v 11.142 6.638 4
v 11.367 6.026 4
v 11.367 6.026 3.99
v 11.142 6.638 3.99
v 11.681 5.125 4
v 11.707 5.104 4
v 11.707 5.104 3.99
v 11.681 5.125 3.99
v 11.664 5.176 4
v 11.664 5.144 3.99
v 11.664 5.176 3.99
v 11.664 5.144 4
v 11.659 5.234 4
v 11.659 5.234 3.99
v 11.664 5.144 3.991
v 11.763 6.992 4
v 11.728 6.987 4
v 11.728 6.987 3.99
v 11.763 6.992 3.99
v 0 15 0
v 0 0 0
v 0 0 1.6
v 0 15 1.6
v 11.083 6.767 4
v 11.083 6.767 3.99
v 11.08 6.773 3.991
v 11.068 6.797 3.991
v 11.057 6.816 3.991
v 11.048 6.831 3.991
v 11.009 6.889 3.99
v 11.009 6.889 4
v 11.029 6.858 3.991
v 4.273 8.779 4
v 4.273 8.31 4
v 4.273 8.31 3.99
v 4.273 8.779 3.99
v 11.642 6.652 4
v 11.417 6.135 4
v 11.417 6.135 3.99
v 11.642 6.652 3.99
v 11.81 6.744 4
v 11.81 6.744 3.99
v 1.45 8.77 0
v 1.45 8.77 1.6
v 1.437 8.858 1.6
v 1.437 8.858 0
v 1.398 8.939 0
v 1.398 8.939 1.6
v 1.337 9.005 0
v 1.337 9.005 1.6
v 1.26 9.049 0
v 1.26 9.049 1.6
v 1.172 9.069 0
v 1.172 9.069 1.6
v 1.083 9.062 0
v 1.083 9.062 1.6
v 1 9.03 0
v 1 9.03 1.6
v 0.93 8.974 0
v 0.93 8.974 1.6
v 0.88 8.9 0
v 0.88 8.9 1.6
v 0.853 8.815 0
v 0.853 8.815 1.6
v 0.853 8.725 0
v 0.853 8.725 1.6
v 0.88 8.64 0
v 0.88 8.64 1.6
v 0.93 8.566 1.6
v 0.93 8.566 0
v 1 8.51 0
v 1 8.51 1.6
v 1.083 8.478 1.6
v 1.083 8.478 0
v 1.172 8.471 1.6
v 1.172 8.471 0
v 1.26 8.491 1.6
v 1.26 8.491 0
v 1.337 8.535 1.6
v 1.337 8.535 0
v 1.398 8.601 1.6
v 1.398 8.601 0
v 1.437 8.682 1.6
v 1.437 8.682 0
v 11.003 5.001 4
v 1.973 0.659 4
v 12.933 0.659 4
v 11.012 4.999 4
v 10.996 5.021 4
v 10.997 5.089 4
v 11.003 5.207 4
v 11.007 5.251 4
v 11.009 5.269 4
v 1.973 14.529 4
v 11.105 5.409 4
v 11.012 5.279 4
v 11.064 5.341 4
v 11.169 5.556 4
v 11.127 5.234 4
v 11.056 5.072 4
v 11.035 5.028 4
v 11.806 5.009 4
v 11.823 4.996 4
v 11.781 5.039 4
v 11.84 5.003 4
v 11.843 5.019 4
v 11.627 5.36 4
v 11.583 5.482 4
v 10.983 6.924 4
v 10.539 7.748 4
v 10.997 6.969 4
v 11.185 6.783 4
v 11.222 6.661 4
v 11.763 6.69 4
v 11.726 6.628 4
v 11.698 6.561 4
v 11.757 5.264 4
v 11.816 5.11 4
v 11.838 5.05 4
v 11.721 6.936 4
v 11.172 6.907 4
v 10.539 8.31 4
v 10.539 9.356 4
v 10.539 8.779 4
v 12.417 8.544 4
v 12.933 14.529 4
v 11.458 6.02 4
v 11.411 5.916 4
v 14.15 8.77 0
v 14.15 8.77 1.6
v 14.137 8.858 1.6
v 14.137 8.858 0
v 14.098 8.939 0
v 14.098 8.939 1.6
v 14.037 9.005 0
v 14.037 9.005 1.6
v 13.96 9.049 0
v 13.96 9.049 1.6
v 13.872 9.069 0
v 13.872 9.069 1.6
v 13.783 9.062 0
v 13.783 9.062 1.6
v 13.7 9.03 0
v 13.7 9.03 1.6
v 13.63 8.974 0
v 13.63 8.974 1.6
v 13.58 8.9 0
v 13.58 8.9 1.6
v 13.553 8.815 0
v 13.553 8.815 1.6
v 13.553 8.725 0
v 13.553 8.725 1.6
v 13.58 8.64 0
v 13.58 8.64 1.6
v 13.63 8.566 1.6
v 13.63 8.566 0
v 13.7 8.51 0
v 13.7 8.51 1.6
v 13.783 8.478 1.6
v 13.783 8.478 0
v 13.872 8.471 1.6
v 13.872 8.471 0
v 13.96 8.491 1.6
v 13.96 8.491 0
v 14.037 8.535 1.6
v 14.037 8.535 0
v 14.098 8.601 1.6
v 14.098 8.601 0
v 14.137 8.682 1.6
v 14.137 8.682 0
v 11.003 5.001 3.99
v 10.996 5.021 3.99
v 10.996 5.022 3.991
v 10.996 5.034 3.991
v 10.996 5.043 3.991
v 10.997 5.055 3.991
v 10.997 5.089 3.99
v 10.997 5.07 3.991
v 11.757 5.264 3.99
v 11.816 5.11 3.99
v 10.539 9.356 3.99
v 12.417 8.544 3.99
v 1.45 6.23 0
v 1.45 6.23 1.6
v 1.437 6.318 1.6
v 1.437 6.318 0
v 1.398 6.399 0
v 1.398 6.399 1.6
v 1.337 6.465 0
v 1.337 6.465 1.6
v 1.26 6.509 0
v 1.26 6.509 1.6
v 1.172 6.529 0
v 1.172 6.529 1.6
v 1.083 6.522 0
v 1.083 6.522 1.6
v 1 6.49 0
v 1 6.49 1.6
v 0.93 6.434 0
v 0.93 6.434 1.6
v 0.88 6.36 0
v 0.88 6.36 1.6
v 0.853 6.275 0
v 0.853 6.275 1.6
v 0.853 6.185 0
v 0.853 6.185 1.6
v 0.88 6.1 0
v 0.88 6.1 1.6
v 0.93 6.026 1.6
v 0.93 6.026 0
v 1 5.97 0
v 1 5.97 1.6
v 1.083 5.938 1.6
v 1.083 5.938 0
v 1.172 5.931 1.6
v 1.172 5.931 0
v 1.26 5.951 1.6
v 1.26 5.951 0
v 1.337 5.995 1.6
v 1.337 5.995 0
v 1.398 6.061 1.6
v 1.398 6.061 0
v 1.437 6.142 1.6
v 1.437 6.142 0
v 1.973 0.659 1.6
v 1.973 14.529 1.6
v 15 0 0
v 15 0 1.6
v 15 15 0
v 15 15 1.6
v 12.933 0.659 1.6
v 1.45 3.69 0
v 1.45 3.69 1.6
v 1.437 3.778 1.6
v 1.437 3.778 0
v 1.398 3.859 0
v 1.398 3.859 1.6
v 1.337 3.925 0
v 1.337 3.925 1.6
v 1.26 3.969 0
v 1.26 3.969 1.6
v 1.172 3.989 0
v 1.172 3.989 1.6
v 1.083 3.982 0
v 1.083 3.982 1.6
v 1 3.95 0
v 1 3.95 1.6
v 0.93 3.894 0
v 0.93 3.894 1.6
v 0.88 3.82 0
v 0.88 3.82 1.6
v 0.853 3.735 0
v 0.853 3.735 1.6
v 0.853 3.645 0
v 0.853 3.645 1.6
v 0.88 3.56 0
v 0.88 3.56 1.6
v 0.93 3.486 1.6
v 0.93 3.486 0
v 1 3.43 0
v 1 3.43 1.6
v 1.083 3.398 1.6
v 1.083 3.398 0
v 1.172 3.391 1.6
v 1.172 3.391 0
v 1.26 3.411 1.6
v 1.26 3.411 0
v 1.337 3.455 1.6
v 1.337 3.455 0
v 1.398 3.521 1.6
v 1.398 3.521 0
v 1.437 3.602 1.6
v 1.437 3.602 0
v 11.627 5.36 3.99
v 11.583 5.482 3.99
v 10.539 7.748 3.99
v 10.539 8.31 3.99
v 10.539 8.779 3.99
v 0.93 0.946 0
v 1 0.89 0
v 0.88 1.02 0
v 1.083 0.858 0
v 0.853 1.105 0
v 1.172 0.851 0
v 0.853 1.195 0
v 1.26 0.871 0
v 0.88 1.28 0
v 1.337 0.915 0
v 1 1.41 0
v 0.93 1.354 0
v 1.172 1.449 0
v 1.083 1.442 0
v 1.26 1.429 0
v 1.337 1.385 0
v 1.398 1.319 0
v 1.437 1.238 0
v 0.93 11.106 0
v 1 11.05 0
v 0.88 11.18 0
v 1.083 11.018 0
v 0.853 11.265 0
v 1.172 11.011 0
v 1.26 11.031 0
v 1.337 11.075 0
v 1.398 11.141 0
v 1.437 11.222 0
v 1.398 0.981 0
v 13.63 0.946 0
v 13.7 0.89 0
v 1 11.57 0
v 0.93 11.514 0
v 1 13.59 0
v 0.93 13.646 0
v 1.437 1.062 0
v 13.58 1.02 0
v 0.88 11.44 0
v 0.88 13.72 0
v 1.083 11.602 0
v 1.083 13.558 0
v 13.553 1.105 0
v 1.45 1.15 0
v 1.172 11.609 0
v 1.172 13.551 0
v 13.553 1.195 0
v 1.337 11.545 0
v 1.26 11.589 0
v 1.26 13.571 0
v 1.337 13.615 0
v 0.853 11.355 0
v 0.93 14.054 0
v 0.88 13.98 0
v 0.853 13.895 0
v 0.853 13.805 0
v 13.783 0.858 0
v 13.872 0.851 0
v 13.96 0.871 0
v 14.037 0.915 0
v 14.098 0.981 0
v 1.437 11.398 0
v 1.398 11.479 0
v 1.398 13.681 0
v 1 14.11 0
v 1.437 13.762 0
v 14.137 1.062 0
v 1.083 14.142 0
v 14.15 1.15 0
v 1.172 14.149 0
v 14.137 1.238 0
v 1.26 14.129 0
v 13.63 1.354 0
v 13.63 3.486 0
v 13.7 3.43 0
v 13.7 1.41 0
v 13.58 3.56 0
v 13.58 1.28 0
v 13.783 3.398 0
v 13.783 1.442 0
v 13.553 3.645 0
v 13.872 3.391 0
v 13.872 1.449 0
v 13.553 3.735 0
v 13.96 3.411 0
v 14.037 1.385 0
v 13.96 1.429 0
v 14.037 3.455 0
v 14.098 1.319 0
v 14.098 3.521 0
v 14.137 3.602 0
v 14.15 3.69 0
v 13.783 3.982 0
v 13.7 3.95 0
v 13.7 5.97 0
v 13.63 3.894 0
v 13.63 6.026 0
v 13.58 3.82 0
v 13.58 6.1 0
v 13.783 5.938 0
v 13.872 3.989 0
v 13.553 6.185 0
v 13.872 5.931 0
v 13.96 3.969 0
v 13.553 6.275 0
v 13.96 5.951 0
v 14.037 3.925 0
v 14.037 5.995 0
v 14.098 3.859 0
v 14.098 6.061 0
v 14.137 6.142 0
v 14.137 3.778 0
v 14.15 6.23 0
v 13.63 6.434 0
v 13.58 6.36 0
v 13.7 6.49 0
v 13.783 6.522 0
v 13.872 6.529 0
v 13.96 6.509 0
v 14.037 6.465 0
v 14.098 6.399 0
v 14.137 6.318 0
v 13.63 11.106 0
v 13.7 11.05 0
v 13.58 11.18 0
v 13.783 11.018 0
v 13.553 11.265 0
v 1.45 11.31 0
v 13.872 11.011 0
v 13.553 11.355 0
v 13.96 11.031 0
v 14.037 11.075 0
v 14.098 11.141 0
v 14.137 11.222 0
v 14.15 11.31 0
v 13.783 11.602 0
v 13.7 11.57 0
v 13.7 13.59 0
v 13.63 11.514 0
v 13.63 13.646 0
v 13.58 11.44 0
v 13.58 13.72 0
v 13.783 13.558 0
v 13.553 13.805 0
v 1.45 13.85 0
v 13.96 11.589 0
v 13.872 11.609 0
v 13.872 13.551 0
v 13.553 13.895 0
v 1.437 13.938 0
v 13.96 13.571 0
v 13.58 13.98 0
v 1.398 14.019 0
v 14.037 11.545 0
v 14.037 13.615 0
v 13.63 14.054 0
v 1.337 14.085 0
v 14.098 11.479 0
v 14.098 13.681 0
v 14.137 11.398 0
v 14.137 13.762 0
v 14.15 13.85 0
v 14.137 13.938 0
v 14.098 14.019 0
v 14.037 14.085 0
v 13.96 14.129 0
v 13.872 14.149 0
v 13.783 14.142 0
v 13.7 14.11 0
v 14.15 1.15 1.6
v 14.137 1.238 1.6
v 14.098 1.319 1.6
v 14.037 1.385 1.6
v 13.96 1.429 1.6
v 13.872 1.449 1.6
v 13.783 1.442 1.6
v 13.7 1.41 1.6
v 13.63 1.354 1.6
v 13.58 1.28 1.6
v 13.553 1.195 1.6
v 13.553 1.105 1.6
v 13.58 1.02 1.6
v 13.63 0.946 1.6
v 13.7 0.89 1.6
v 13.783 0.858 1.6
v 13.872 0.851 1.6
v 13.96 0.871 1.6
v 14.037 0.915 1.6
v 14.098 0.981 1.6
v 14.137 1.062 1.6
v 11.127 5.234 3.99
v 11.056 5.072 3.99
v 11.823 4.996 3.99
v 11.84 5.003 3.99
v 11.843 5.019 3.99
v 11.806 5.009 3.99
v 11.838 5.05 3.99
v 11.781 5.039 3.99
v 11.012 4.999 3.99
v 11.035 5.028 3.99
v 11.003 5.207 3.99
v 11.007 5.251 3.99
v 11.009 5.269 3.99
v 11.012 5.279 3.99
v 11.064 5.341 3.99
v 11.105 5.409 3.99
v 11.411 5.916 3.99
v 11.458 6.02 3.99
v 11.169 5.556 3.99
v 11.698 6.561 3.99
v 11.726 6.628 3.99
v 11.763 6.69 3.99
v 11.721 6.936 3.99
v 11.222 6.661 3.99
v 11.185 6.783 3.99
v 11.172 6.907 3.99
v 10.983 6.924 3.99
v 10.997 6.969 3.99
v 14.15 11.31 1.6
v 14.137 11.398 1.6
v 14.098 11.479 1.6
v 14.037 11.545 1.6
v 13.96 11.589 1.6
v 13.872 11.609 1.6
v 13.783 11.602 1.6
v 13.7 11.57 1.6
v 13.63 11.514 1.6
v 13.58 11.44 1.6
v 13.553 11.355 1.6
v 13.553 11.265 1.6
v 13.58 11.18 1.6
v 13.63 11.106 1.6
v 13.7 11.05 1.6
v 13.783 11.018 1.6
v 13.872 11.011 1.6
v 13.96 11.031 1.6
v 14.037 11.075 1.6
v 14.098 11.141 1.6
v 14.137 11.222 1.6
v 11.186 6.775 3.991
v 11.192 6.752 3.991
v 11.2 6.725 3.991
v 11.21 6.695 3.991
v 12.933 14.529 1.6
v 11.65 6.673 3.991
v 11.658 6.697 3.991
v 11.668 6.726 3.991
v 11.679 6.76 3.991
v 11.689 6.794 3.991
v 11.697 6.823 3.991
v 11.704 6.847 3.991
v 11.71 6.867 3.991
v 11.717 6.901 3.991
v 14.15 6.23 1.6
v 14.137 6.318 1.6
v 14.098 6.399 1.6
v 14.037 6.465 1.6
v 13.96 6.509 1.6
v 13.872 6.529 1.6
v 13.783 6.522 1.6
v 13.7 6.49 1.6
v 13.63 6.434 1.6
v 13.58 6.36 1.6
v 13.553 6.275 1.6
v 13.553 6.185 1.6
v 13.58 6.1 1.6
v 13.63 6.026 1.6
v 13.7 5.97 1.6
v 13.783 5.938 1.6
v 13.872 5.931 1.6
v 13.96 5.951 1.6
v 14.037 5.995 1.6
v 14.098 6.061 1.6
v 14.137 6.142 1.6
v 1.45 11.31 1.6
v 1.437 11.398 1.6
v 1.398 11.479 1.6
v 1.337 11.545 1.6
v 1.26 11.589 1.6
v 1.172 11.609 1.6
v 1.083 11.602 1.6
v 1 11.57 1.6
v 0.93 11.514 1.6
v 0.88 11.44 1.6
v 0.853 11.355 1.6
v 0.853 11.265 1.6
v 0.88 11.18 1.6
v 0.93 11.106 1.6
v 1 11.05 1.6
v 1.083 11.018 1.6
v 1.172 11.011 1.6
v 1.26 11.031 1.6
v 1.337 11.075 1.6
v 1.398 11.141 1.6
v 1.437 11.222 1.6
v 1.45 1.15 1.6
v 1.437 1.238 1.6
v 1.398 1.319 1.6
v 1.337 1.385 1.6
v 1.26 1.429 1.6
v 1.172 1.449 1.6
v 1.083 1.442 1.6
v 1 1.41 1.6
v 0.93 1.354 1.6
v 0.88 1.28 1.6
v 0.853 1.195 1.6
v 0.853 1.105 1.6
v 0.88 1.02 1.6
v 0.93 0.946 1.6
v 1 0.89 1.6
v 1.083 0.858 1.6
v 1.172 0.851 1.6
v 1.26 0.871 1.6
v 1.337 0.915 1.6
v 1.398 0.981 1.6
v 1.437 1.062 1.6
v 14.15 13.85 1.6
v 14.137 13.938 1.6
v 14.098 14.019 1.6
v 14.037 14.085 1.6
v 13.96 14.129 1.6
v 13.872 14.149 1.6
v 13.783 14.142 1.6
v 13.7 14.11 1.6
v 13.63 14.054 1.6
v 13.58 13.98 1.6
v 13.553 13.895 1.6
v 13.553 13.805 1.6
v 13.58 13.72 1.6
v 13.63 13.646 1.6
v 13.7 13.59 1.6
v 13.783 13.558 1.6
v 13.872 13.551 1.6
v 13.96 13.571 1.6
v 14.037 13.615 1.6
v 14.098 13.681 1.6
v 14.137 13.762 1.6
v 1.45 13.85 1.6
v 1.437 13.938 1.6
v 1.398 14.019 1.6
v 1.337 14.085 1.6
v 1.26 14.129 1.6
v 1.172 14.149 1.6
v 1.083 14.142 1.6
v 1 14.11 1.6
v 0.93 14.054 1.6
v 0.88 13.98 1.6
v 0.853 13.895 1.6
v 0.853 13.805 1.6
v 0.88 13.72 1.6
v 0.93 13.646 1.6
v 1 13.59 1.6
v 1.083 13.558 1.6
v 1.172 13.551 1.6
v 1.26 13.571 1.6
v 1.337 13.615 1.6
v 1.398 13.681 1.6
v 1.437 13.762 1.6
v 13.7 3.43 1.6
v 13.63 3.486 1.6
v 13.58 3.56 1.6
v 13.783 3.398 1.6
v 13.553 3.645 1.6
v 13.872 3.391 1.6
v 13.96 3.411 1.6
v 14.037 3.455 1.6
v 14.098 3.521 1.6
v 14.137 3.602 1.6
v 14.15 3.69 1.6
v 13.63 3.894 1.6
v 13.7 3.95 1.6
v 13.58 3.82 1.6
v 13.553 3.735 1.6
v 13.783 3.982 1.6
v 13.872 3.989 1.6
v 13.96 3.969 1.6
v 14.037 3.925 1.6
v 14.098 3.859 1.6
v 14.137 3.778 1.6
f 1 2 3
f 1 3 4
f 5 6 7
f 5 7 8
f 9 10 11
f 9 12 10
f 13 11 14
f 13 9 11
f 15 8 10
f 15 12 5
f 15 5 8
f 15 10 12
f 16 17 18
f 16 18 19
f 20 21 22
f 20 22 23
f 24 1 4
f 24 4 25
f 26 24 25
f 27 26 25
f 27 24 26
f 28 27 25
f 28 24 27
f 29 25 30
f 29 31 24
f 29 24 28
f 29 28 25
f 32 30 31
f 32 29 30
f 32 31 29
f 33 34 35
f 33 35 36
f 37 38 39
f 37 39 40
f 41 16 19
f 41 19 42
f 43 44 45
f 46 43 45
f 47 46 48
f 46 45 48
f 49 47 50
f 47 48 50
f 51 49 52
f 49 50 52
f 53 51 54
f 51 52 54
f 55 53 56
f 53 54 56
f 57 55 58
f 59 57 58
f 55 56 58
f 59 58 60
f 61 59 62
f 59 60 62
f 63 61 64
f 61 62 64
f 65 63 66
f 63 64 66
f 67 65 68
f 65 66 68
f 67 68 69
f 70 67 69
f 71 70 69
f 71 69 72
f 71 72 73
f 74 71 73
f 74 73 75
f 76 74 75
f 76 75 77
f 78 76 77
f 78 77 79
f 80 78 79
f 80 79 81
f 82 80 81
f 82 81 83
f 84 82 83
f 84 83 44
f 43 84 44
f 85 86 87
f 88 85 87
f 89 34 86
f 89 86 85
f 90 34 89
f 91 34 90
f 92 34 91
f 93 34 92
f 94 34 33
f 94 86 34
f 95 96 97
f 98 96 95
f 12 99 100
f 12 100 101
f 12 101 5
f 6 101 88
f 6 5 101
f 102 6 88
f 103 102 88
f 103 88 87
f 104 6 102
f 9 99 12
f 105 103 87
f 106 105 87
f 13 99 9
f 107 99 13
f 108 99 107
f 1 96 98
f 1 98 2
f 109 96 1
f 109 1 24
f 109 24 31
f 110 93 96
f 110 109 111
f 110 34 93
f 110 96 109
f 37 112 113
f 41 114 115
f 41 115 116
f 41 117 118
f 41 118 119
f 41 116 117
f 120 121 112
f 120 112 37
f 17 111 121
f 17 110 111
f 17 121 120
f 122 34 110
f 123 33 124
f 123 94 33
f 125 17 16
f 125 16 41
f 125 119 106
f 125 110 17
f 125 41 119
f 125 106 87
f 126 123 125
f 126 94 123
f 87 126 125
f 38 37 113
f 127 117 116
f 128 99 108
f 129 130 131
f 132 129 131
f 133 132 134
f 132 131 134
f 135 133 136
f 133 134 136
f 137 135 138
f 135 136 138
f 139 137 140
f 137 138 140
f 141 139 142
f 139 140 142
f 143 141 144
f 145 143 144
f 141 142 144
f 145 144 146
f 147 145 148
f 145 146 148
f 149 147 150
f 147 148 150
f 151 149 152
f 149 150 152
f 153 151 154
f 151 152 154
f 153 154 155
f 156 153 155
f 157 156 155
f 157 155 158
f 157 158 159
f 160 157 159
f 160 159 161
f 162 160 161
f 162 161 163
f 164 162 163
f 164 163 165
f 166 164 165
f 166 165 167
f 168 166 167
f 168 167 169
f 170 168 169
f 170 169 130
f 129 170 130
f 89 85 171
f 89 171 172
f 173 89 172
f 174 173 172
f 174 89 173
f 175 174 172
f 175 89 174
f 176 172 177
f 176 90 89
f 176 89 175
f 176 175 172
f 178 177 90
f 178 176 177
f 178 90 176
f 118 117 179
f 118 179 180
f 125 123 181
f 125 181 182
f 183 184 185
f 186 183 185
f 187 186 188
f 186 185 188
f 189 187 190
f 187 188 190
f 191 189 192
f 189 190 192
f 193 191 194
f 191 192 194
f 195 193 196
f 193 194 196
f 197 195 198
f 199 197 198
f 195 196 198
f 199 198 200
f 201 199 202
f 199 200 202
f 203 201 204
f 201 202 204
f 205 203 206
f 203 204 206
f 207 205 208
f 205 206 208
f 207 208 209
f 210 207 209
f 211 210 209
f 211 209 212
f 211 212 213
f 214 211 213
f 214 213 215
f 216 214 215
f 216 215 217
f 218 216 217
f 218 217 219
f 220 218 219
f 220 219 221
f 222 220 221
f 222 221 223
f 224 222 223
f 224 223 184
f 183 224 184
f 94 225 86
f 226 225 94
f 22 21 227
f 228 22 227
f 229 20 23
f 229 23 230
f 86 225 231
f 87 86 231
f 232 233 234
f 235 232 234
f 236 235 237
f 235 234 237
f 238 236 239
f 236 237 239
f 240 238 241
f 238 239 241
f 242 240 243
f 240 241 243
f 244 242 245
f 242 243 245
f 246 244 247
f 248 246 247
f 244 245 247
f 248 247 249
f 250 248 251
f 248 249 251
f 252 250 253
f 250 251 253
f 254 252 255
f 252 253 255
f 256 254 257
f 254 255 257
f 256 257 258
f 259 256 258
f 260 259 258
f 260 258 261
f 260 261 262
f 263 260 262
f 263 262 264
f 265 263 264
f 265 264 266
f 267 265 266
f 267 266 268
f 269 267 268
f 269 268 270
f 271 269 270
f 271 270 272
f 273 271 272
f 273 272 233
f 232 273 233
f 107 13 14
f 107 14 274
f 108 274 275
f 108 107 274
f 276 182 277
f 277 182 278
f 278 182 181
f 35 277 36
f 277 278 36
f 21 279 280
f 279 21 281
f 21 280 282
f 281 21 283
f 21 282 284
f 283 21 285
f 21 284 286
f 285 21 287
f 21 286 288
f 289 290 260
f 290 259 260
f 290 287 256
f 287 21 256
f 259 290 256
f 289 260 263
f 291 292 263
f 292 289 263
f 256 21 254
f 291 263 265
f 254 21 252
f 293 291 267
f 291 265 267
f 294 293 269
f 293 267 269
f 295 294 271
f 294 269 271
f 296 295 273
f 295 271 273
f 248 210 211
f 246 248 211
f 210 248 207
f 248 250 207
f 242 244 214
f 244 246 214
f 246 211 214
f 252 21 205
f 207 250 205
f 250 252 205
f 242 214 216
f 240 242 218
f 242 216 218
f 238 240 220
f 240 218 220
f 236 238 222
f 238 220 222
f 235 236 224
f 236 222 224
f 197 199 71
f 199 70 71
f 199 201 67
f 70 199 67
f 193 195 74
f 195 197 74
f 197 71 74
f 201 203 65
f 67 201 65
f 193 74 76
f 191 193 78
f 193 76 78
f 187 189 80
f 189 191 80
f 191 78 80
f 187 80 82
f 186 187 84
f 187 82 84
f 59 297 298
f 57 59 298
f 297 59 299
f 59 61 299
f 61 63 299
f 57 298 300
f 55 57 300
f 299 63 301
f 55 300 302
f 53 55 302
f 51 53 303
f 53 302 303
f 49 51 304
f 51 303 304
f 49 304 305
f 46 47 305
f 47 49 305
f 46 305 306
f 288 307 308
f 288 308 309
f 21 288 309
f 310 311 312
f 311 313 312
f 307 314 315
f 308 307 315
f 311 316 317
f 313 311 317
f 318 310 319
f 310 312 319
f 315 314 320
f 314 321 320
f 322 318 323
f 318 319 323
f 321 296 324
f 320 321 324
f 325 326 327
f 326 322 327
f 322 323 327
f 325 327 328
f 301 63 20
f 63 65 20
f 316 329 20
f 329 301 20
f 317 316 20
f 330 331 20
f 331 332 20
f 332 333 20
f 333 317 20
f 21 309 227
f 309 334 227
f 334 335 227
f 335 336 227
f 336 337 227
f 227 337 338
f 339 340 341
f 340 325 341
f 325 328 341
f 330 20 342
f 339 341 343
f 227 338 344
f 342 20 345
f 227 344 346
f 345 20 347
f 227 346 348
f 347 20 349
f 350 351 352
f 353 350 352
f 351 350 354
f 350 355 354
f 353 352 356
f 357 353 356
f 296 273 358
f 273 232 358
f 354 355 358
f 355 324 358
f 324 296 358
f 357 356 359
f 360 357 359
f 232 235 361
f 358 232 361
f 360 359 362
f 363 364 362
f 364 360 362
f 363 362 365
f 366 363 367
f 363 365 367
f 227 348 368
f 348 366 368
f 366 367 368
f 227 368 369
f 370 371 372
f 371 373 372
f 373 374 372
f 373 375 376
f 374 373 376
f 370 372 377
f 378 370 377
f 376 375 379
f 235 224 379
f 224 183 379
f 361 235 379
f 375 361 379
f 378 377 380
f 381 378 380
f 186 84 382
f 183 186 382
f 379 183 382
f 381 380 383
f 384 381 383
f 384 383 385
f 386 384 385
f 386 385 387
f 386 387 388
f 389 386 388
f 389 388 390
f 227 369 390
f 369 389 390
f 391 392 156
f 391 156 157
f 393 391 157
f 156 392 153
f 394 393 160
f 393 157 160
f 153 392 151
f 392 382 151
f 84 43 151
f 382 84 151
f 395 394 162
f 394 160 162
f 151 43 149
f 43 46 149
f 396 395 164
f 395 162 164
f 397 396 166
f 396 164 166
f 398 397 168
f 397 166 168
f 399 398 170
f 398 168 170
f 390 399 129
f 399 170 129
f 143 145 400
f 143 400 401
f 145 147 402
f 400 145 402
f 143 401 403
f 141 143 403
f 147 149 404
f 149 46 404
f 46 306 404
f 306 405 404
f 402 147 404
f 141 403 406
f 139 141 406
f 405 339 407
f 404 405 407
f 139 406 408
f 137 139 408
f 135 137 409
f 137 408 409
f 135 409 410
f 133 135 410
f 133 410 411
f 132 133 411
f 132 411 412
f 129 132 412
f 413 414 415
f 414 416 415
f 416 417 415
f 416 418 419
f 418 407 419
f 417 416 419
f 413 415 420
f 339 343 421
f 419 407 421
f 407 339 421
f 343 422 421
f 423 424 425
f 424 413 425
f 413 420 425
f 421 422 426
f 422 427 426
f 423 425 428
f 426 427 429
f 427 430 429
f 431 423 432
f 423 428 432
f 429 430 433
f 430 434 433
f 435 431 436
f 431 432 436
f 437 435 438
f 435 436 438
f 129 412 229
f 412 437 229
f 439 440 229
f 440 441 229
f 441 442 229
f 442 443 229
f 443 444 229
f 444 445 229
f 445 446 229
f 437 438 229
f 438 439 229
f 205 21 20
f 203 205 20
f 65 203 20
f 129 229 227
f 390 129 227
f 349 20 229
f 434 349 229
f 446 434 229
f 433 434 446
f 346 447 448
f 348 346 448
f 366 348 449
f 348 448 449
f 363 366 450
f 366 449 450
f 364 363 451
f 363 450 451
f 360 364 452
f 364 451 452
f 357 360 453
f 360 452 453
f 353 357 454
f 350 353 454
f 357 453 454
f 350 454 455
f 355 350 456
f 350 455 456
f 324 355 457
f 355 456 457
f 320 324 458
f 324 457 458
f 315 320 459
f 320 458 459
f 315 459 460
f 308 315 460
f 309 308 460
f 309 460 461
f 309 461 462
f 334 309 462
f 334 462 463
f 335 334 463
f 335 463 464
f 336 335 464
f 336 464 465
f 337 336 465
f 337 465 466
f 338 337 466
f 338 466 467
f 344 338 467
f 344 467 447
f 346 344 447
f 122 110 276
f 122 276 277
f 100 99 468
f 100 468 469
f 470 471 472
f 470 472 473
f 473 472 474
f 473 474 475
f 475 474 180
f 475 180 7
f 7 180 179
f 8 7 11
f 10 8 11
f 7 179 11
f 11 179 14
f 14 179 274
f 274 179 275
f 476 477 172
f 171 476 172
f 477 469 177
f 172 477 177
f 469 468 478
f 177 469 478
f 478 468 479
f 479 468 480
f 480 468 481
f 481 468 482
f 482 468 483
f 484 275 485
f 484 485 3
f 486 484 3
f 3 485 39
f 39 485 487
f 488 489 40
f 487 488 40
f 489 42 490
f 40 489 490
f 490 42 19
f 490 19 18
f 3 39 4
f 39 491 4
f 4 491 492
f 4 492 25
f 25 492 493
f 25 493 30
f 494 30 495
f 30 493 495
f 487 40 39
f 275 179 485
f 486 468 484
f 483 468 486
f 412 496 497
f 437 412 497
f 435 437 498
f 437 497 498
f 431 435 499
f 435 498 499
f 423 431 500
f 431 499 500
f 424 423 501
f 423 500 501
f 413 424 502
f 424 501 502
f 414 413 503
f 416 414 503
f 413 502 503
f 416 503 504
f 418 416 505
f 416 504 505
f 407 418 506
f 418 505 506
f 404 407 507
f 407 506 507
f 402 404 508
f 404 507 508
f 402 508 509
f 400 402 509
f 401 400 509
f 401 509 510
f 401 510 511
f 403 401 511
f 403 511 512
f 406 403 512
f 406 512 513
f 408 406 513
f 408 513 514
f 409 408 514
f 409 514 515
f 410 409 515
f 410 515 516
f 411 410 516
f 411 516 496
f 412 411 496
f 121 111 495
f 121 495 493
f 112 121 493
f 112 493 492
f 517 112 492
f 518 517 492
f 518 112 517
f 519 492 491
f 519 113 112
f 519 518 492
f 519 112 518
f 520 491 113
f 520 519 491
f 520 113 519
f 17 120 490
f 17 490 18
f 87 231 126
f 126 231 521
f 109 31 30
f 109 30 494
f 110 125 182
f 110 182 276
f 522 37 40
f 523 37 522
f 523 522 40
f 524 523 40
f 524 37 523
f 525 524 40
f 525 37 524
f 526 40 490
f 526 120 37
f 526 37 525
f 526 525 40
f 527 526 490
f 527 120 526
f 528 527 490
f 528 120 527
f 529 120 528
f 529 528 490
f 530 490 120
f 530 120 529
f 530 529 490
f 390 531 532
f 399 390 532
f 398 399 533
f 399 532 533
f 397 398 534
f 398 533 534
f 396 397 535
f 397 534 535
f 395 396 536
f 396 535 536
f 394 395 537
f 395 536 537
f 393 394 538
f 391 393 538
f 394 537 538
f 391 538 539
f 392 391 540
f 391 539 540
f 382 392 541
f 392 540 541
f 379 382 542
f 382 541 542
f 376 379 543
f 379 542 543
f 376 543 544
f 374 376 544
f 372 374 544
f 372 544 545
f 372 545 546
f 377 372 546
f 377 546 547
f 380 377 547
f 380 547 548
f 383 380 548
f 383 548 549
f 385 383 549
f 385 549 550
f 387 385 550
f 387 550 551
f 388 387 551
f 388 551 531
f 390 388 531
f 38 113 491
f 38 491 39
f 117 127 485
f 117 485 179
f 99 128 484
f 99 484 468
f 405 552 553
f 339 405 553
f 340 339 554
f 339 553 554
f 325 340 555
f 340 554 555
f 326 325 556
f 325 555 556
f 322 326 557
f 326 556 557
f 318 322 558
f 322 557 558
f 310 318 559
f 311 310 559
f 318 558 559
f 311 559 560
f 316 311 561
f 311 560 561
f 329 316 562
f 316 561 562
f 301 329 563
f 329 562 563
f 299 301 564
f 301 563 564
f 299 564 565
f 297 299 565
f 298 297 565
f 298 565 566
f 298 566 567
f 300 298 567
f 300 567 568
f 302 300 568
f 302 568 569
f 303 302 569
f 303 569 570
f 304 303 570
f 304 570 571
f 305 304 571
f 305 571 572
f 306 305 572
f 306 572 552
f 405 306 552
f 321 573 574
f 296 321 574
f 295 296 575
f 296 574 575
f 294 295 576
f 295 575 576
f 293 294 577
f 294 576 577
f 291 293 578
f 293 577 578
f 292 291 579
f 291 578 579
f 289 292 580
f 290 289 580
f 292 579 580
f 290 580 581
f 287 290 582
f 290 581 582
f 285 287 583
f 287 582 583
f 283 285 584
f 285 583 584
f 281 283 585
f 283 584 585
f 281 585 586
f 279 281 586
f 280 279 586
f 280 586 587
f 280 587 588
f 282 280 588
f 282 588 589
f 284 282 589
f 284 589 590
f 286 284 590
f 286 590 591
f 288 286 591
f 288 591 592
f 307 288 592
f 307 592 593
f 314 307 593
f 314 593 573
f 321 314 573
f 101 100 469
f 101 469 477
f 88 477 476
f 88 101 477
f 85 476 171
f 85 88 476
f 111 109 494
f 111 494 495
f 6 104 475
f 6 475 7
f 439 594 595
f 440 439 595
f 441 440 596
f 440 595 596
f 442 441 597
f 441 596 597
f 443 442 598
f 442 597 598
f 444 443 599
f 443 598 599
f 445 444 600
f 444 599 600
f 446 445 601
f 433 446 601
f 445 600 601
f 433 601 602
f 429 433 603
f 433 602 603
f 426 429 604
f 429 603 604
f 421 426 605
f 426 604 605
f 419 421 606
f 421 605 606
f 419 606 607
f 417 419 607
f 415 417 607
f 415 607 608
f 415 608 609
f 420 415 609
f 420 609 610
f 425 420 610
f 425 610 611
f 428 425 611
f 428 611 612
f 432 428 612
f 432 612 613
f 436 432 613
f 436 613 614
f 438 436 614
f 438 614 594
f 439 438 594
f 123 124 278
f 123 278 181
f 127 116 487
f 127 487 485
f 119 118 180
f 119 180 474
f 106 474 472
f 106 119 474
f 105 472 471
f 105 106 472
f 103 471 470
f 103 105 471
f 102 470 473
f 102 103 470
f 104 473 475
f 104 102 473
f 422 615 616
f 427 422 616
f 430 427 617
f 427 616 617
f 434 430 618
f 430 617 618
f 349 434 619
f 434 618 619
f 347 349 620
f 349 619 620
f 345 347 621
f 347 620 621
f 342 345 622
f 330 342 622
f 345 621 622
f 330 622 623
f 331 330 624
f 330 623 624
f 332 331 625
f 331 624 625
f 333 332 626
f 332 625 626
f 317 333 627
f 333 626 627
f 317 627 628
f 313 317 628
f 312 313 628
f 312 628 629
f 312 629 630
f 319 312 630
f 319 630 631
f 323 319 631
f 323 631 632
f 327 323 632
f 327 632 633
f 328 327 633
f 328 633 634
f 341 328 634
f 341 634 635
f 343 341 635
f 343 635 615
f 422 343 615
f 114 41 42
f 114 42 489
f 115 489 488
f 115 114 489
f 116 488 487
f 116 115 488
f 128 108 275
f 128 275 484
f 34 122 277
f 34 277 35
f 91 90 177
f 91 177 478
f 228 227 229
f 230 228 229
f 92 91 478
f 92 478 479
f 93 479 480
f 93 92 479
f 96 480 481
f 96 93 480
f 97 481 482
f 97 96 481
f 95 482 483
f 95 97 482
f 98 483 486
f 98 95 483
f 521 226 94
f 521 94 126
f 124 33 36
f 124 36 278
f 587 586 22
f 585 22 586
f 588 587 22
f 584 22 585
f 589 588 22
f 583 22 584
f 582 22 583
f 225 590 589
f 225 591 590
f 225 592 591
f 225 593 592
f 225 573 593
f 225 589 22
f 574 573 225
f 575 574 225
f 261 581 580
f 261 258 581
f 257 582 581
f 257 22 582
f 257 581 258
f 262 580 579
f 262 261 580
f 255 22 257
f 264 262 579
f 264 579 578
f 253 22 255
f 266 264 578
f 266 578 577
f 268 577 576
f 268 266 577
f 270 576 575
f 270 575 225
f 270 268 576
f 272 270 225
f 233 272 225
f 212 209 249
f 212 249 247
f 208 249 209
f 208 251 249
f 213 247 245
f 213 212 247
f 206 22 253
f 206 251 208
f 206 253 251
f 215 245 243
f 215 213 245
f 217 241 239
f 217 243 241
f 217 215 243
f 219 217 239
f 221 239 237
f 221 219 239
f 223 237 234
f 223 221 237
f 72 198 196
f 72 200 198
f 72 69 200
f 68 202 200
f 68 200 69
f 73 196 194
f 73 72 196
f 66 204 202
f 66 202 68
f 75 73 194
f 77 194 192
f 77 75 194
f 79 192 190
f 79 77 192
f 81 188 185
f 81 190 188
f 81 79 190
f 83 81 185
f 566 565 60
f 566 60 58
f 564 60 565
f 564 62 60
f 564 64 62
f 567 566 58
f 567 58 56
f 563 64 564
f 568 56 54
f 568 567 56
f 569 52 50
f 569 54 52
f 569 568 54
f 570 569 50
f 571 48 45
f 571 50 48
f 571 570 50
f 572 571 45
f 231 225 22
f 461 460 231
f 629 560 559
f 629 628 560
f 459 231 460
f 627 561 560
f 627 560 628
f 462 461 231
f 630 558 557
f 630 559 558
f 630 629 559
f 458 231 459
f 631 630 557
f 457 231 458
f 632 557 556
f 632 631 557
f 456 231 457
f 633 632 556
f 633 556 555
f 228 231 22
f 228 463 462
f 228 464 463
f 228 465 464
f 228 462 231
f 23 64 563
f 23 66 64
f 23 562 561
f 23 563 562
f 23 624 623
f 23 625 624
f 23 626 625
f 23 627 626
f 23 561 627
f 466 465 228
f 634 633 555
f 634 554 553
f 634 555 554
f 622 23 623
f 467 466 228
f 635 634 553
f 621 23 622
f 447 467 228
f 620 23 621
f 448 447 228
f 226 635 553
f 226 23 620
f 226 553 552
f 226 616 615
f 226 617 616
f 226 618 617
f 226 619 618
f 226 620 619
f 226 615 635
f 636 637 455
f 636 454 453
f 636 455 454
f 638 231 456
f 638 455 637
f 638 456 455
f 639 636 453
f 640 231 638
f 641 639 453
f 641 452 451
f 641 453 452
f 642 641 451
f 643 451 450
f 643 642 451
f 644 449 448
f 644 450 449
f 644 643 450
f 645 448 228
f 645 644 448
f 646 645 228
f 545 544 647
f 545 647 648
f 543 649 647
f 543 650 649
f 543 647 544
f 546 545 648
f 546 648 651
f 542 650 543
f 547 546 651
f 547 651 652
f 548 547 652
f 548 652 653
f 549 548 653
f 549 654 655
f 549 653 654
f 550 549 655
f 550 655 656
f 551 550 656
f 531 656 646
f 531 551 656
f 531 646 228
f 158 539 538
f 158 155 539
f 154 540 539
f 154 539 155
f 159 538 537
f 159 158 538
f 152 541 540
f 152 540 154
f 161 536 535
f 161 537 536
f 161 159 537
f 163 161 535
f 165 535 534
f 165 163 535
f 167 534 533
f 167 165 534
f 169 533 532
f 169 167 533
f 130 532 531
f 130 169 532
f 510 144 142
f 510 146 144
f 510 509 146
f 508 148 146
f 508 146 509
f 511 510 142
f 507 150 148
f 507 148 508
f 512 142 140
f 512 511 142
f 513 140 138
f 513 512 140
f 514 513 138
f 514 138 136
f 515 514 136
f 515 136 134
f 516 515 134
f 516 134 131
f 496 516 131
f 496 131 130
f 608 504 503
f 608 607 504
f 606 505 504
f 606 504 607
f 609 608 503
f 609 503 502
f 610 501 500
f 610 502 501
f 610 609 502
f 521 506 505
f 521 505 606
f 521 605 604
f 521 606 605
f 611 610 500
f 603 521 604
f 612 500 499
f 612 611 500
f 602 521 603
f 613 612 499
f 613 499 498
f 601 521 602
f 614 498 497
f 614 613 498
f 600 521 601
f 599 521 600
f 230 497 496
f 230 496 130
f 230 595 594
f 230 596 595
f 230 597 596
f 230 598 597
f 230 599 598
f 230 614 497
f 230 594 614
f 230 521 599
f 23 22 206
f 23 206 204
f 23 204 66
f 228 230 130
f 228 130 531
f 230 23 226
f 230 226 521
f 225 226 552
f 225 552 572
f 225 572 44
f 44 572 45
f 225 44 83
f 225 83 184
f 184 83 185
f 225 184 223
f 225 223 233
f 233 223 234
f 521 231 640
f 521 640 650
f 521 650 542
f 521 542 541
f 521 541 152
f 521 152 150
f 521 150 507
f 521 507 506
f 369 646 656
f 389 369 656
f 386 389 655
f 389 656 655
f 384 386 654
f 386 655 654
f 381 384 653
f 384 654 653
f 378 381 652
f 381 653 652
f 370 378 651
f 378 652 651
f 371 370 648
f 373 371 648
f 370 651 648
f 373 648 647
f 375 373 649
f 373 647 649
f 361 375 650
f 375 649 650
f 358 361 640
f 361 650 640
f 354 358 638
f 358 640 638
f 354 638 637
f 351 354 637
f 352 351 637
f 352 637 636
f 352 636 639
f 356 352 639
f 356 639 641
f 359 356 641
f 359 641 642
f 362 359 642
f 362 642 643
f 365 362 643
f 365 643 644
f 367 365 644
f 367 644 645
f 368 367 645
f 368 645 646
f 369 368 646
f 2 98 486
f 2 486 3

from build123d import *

# Parameters (mm, degrees)
SKETCH_1_W                 = 15
SKETCH_1_H                 = 15
EXTRUDE_1_DEPTH            = 1.6
SKETCH_2_W                 = 10.960360983
SKETCH_2_H                 = 13.870606726
EXTRUDE_2_DEPTH            = 2.4
SKETCH_3_R                 = 0.3
CUT_EXTRUDE_1_DEPTH        = 2.4
PATTERN_LINEAR_1_COUNT     = 4
PATTERN_LINEAR_1_PITCH     = 2.54
PATTERN_LINEAR_1_COL_COUNT = 3
PATTERN_LINEAR_1_COL_PITCH = 2.54
CUT_EXTRUDE_2_DEPTH        = 0.01
CUT_EXTRUDE_3_DEPTH        = 0.01


with BuildPart() as part:
    # 草图1 → 凸台-拉伸1 (new body)
    with BuildSketch(Plane.XY):
        with Locations((7.5, 7.5)):
            Rectangle(SKETCH_1_W, SKETCH_1_H)
    extrude(amount=EXTRUDE_1_DEPTH)

    # 草图2 → 凸台-拉伸2 (add)
    with BuildSketch(Plane.XY.offset(1.6)):
        with Locations((7.453060553, 7.593878895)):
            Rectangle(SKETCH_2_W, SKETCH_2_H)
    extrude(amount=EXTRUDE_2_DEPTH)

    # 草图3 → 切除-拉伸1 (cut)
    with BuildSketch(Plane.XY.offset(1.6)):
        with Locations((1.15, 8.77)):
            Circle(SKETCH_3_R)
        with Locations((13.85, 8.77)):
            Circle(SKETCH_3_R)
    cut_extrude_1 = extrude(amount=-CUT_EXTRUDE_1_DEPTH, mode=Mode.SUBTRACT)

    # 阵列(线性)1: 切除-拉伸1 ×4
    with Locations(*[(0, -i * PATTERN_LINEAR_1_PITCH, 0) for i in range(1, PATTERN_LINEAR_1_COUNT)]):
        add(cut_extrude_1, mode=Mode.SUBTRACT)

    # 阵列(线性)1 col: 切除-拉伸1 ×3
    with Locations(*[(0, i * PATTERN_LINEAR_1_COL_PITCH, 0) for i in range(1, PATTERN_LINEAR_1_COL_COUNT)]):
        add(cut_extrude_1, mode=Mode.SUBTRACT)

    # 草图4 → 切除-拉伸2 (cut)
    with BuildSketch(Plane.XY.offset(4)):
        Polygon((10.539329223, 8.779099943), (10.539329223, 9.356105561), (12.417225748, 8.544402706), (10.539329223, 7.747506957), (10.539329223, 8.309705469), (4.272912987, 8.309705469), (4.272912987, 8.779099943), align=None)
    extrude(amount=-CUT_EXTRUDE_2_DEPTH, mode=Mode.SUBTRACT)

    # 草图5 → 切除-拉伸3 (cut)
    with BuildSketch(Plane.XY.offset(4)):
        with BuildLine():
            Line((11.417194479, 6.135405226), (11.641792388, 6.652462011))
            add(Edge.make_bspline(
                [(11.641792388, 6.652462011), (11.644459763, 6.65915976), (11.650338175, 6.673920386), (11.659052259, 6.698612128), (11.668619361, 6.727827369), (11.678458783, 6.760197023), (11.688890182, 6.792254636), (11.696772433, 6.821510802), (11.70401352, 6.845628042), (11.711125127, 6.871472603), (11.717769102, 6.901008766), (11.720240181, 6.924455008), (11.721474297, 6.936164633)],
                knots=[0, 0, 0, 0, 0.732180493, 1.613593324, 2.658872914, 3.854365511, 5.049858108, 6.082130019, 6.931166509, 7.607179292, 8.804966943, 10, 10, 10, 10], degree=3))
            Line((11.721474297, 6.936164633), (11.727603675, 6.986513092))
            Line((11.727603675, 6.986513092), (11.763066503, 6.992204657))
            Line((11.763066503, 6.992204657), (11.810350273, 6.743964863))
            add(Edge.make_bspline(
                [(11.810350273, 6.743964863), (11.803983049, 6.737631034), (11.792553049, 6.726260986), (11.777524458, 6.70884618), (11.763839933, 6.690929745), (11.750533347, 6.674158962), (11.738681861, 6.654023987), (11.727167788, 6.630404394), (11.713111944, 6.598523577), (11.70330589, 6.574415593), (11.697832412, 6.560959159)],
                knots=[0, 0, 0, 0, 0.993153163, 1.782839525, 2.541730564, 3.487713786, 4.146615727, 5.1212284, 6.393146485, 8, 8, 8, 8], degree=3))
            Line((11.697832412, 6.560959159), (11.458348872, 6.020260488))
            Line((11.458348872, 6.020260488), (11.756937125, 5.263720162))
            Line((11.756937125, 5.263720162), (11.816041838, 5.110047909))
            add(Edge.make_bspline(
                [(11.816041838, 5.110047909), (11.822079493, 5.096645389), (11.83288347, 5.072662481), (11.839984094, 5.042737639), (11.842976482, 5.023548034), (11.84296091, 5.013580004), (11.842191359, 5.006194655), (11.83795984, 5.000752614), (11.831545964, 4.998931147), (11.823968923, 4.993934019), (11.812279554, 5.002811857), (11.800976383, 5.014822536), (11.789795068, 5.028797256), (11.782777893, 5.036658786), (11.78057901, 5.039122253)],
                knots=[0, 0, 0, 0, 2.761412339, 4.941361911, 5.773257577, 6.405449525, 6.825913753, 7.139309286, 7.63100465, 8.075064367, 8.689683572, 10.011329248, 11.37683553, 12, 12, 12, 12], degree=3))
            Line((11.78057901, 5.039122253), (11.706588666, 5.103918531))
            add(Edge.make_bspline(
                [(11.706588666, 5.103918531), (11.700534721, 5.10864155), (11.689838198, 5.116986501), (11.676902014, 5.128864442), (11.668284845, 5.13690868), (11.662006372, 5.144967182), (11.663920439, 5.158199661), (11.663417087, 5.177036268), (11.664666192, 5.203655954), (11.661208157, 5.223194895), (11.659304896, 5.2339489)],
                knots=[0, 0, 0, 0, 1.23478745, 2.181706523, 2.812113369, 3.150477244, 3.760922406, 4.816942161, 6.248082283, 8, 8, 8, 8], degree=3))
            add(Edge.make_bspline(
                [(11.659304896, 5.2339489), (11.657570283, 5.243875719), (11.654377363, 5.262148127), (11.650117136, 5.28526259), (11.645361423, 5.305687518), (11.637884912, 5.326783626), (11.62842129, 5.355050264), (11.616354369, 5.387606437), (11.604632167, 5.419985798), (11.594840708, 5.447418485), (11.588025611, 5.467332719), (11.584154921, 5.478105212), (11.582687675, 5.482188694)],
                knots=[0, 0, 0, 0, 1.161118987, 2.137284709, 2.708267813, 3.575038829, 4.713036419, 6.143931784, 7.57482715, 8.681074464, 9.500040603, 10, 10, 10, 10], degree=3))
            Line((11.582687675, 5.482188694), (11.411065101, 5.916498881))
            Line((11.411065101, 5.916498881), (11.127362479, 5.2339489))
            Line((11.127362479, 5.2339489), (11.056436823, 5.071520392))
            add(Edge.make_bspline(
                [(11.056436823, 5.071520392), (11.05092025, 5.059923819), (11.040956646, 5.038978994), (11.027354455, 5.015348737), (11.016079719, 5.003114277), (11.011484356, 4.997021281), (11.004967483, 4.995661847), (11.003967513, 4.998937252), (11.003461488, 5.000594736)],
                knots=[0, 0, 0, 0, 2.381178734, 4.300699059, 5.010137615, 5.450112729, 5.721735305, 6, 6, 6, 6], degree=3))
            add(Edge.make_bspline(
                [(11.003461488, 5.000594736), (11.00235785, 5.001407174), (10.999053439, 5.003839699), (10.996910869, 5.011909178), (10.99504437, 5.022224411), (10.99599754, 5.033010837), (10.996542411, 5.043928598), (10.996917787, 5.0559064), (10.997475336, 5.07136957), (10.997383003, 5.082756589), (10.99733211, 5.0890329)],
                knots=[0, 0, 0, 0, 0.356334141, 1.066903249, 2.083622437, 3.166508591, 3.901872409, 4.984758563, 6.338055839, 8, 8, 8, 8], degree=3))
            Line((10.99733211, 5.0890329), (11.003461488, 5.207242326))
            add(Edge.make_bspline(
                [(11.003461488, 5.207242326), (11.003934057, 5.21659073), (11.004762277, 5.232974646), (11.007181535, 5.254267464), (11.008840176, 5.269124933), (11.012439148, 5.28195374), (11.023092765, 5.294221944), (11.037370069, 5.309576468), (11.05273668, 5.325448758), (11.065473263, 5.341432509), (11.075914366, 5.358198204), (11.086335771, 5.37372244), (11.096619807, 5.390411315), (11.105496545, 5.409732657), (11.116850923, 5.43433534), (11.129168728, 5.463048743), (11.141556256, 5.491950012), (11.152595687, 5.517741604), (11.16110265, 5.538779801), (11.166589578, 5.550938225), (11.168954684, 5.556179038)],
                knots=[0, 0, 0, 0, 1.283891209, 2.250134334, 2.938194825, 3.337125035, 4.054003749, 5.116665614, 6.235914532, 7.077065651, 7.915591523, 8.942962049, 9.643436631, 10.601555545, 11.855913542, 13.362341093, 14.887150874, 16.17010505, 17.211235183, 18, 18, 18, 18], degree=3))
            Line((11.168954684, 5.556179038), (11.36684602, 6.025952053))
            Line((11.36684602, 6.025952053), (11.14224811, 6.637576379))
            add(Edge.make_bspline(
                [(11.14224811, 6.637576379), (11.134802276, 6.653919815), (11.118638723, 6.689398443), (11.098117731, 6.734589073), (11.080824683, 6.771330602), (11.069237657, 6.795692229), (11.058270064, 6.815063097), (11.044964524, 6.835312795), (11.028432624, 6.859216492), (11.015814861, 6.87863072), (11.009153053, 6.888880863)],
                knots=[0, 0, 0, 0, 1.512108789, 3.282513405, 4.178459187, 4.931286787, 5.553090324, 6.050678811, 6.970815613, 8, 8, 8, 8], degree=3))
            Line((11.009153053, 6.888880863), (10.982884292, 6.924343691))
            Line((10.982884292, 6.924343691), (10.99733211, 6.968562772))
            Line((10.99733211, 6.968562772), (11.172019373, 6.906831183))
            add(Edge.make_bspline(
                [(11.172019373, 6.906831183), (11.172798131, 6.895160011), (11.174219289, 6.87386124), (11.175579615, 6.842681643), (11.179648195, 6.810360509), (11.185071037, 6.779955978), (11.192270701, 6.750508012), (11.200401611, 6.723903561), (11.209803376, 6.693508399), (11.217725107, 6.672414865), (11.22193002, 6.661218265)],
                knots=[0, 0, 0, 0, 1.113815777, 2.032607081, 2.970224408, 4.213083212, 4.971379877, 5.85514338, 6.861494526, 8, 8, 8, 8], degree=3))
            Line((11.22193002, 6.661218265), (11.417194479, 6.135405226))
        make_face()
    extrude(amount=-CUT_EXTRUDE_3_DEPTH, mode=Mode.SUBTRACT)


solid = part.part
